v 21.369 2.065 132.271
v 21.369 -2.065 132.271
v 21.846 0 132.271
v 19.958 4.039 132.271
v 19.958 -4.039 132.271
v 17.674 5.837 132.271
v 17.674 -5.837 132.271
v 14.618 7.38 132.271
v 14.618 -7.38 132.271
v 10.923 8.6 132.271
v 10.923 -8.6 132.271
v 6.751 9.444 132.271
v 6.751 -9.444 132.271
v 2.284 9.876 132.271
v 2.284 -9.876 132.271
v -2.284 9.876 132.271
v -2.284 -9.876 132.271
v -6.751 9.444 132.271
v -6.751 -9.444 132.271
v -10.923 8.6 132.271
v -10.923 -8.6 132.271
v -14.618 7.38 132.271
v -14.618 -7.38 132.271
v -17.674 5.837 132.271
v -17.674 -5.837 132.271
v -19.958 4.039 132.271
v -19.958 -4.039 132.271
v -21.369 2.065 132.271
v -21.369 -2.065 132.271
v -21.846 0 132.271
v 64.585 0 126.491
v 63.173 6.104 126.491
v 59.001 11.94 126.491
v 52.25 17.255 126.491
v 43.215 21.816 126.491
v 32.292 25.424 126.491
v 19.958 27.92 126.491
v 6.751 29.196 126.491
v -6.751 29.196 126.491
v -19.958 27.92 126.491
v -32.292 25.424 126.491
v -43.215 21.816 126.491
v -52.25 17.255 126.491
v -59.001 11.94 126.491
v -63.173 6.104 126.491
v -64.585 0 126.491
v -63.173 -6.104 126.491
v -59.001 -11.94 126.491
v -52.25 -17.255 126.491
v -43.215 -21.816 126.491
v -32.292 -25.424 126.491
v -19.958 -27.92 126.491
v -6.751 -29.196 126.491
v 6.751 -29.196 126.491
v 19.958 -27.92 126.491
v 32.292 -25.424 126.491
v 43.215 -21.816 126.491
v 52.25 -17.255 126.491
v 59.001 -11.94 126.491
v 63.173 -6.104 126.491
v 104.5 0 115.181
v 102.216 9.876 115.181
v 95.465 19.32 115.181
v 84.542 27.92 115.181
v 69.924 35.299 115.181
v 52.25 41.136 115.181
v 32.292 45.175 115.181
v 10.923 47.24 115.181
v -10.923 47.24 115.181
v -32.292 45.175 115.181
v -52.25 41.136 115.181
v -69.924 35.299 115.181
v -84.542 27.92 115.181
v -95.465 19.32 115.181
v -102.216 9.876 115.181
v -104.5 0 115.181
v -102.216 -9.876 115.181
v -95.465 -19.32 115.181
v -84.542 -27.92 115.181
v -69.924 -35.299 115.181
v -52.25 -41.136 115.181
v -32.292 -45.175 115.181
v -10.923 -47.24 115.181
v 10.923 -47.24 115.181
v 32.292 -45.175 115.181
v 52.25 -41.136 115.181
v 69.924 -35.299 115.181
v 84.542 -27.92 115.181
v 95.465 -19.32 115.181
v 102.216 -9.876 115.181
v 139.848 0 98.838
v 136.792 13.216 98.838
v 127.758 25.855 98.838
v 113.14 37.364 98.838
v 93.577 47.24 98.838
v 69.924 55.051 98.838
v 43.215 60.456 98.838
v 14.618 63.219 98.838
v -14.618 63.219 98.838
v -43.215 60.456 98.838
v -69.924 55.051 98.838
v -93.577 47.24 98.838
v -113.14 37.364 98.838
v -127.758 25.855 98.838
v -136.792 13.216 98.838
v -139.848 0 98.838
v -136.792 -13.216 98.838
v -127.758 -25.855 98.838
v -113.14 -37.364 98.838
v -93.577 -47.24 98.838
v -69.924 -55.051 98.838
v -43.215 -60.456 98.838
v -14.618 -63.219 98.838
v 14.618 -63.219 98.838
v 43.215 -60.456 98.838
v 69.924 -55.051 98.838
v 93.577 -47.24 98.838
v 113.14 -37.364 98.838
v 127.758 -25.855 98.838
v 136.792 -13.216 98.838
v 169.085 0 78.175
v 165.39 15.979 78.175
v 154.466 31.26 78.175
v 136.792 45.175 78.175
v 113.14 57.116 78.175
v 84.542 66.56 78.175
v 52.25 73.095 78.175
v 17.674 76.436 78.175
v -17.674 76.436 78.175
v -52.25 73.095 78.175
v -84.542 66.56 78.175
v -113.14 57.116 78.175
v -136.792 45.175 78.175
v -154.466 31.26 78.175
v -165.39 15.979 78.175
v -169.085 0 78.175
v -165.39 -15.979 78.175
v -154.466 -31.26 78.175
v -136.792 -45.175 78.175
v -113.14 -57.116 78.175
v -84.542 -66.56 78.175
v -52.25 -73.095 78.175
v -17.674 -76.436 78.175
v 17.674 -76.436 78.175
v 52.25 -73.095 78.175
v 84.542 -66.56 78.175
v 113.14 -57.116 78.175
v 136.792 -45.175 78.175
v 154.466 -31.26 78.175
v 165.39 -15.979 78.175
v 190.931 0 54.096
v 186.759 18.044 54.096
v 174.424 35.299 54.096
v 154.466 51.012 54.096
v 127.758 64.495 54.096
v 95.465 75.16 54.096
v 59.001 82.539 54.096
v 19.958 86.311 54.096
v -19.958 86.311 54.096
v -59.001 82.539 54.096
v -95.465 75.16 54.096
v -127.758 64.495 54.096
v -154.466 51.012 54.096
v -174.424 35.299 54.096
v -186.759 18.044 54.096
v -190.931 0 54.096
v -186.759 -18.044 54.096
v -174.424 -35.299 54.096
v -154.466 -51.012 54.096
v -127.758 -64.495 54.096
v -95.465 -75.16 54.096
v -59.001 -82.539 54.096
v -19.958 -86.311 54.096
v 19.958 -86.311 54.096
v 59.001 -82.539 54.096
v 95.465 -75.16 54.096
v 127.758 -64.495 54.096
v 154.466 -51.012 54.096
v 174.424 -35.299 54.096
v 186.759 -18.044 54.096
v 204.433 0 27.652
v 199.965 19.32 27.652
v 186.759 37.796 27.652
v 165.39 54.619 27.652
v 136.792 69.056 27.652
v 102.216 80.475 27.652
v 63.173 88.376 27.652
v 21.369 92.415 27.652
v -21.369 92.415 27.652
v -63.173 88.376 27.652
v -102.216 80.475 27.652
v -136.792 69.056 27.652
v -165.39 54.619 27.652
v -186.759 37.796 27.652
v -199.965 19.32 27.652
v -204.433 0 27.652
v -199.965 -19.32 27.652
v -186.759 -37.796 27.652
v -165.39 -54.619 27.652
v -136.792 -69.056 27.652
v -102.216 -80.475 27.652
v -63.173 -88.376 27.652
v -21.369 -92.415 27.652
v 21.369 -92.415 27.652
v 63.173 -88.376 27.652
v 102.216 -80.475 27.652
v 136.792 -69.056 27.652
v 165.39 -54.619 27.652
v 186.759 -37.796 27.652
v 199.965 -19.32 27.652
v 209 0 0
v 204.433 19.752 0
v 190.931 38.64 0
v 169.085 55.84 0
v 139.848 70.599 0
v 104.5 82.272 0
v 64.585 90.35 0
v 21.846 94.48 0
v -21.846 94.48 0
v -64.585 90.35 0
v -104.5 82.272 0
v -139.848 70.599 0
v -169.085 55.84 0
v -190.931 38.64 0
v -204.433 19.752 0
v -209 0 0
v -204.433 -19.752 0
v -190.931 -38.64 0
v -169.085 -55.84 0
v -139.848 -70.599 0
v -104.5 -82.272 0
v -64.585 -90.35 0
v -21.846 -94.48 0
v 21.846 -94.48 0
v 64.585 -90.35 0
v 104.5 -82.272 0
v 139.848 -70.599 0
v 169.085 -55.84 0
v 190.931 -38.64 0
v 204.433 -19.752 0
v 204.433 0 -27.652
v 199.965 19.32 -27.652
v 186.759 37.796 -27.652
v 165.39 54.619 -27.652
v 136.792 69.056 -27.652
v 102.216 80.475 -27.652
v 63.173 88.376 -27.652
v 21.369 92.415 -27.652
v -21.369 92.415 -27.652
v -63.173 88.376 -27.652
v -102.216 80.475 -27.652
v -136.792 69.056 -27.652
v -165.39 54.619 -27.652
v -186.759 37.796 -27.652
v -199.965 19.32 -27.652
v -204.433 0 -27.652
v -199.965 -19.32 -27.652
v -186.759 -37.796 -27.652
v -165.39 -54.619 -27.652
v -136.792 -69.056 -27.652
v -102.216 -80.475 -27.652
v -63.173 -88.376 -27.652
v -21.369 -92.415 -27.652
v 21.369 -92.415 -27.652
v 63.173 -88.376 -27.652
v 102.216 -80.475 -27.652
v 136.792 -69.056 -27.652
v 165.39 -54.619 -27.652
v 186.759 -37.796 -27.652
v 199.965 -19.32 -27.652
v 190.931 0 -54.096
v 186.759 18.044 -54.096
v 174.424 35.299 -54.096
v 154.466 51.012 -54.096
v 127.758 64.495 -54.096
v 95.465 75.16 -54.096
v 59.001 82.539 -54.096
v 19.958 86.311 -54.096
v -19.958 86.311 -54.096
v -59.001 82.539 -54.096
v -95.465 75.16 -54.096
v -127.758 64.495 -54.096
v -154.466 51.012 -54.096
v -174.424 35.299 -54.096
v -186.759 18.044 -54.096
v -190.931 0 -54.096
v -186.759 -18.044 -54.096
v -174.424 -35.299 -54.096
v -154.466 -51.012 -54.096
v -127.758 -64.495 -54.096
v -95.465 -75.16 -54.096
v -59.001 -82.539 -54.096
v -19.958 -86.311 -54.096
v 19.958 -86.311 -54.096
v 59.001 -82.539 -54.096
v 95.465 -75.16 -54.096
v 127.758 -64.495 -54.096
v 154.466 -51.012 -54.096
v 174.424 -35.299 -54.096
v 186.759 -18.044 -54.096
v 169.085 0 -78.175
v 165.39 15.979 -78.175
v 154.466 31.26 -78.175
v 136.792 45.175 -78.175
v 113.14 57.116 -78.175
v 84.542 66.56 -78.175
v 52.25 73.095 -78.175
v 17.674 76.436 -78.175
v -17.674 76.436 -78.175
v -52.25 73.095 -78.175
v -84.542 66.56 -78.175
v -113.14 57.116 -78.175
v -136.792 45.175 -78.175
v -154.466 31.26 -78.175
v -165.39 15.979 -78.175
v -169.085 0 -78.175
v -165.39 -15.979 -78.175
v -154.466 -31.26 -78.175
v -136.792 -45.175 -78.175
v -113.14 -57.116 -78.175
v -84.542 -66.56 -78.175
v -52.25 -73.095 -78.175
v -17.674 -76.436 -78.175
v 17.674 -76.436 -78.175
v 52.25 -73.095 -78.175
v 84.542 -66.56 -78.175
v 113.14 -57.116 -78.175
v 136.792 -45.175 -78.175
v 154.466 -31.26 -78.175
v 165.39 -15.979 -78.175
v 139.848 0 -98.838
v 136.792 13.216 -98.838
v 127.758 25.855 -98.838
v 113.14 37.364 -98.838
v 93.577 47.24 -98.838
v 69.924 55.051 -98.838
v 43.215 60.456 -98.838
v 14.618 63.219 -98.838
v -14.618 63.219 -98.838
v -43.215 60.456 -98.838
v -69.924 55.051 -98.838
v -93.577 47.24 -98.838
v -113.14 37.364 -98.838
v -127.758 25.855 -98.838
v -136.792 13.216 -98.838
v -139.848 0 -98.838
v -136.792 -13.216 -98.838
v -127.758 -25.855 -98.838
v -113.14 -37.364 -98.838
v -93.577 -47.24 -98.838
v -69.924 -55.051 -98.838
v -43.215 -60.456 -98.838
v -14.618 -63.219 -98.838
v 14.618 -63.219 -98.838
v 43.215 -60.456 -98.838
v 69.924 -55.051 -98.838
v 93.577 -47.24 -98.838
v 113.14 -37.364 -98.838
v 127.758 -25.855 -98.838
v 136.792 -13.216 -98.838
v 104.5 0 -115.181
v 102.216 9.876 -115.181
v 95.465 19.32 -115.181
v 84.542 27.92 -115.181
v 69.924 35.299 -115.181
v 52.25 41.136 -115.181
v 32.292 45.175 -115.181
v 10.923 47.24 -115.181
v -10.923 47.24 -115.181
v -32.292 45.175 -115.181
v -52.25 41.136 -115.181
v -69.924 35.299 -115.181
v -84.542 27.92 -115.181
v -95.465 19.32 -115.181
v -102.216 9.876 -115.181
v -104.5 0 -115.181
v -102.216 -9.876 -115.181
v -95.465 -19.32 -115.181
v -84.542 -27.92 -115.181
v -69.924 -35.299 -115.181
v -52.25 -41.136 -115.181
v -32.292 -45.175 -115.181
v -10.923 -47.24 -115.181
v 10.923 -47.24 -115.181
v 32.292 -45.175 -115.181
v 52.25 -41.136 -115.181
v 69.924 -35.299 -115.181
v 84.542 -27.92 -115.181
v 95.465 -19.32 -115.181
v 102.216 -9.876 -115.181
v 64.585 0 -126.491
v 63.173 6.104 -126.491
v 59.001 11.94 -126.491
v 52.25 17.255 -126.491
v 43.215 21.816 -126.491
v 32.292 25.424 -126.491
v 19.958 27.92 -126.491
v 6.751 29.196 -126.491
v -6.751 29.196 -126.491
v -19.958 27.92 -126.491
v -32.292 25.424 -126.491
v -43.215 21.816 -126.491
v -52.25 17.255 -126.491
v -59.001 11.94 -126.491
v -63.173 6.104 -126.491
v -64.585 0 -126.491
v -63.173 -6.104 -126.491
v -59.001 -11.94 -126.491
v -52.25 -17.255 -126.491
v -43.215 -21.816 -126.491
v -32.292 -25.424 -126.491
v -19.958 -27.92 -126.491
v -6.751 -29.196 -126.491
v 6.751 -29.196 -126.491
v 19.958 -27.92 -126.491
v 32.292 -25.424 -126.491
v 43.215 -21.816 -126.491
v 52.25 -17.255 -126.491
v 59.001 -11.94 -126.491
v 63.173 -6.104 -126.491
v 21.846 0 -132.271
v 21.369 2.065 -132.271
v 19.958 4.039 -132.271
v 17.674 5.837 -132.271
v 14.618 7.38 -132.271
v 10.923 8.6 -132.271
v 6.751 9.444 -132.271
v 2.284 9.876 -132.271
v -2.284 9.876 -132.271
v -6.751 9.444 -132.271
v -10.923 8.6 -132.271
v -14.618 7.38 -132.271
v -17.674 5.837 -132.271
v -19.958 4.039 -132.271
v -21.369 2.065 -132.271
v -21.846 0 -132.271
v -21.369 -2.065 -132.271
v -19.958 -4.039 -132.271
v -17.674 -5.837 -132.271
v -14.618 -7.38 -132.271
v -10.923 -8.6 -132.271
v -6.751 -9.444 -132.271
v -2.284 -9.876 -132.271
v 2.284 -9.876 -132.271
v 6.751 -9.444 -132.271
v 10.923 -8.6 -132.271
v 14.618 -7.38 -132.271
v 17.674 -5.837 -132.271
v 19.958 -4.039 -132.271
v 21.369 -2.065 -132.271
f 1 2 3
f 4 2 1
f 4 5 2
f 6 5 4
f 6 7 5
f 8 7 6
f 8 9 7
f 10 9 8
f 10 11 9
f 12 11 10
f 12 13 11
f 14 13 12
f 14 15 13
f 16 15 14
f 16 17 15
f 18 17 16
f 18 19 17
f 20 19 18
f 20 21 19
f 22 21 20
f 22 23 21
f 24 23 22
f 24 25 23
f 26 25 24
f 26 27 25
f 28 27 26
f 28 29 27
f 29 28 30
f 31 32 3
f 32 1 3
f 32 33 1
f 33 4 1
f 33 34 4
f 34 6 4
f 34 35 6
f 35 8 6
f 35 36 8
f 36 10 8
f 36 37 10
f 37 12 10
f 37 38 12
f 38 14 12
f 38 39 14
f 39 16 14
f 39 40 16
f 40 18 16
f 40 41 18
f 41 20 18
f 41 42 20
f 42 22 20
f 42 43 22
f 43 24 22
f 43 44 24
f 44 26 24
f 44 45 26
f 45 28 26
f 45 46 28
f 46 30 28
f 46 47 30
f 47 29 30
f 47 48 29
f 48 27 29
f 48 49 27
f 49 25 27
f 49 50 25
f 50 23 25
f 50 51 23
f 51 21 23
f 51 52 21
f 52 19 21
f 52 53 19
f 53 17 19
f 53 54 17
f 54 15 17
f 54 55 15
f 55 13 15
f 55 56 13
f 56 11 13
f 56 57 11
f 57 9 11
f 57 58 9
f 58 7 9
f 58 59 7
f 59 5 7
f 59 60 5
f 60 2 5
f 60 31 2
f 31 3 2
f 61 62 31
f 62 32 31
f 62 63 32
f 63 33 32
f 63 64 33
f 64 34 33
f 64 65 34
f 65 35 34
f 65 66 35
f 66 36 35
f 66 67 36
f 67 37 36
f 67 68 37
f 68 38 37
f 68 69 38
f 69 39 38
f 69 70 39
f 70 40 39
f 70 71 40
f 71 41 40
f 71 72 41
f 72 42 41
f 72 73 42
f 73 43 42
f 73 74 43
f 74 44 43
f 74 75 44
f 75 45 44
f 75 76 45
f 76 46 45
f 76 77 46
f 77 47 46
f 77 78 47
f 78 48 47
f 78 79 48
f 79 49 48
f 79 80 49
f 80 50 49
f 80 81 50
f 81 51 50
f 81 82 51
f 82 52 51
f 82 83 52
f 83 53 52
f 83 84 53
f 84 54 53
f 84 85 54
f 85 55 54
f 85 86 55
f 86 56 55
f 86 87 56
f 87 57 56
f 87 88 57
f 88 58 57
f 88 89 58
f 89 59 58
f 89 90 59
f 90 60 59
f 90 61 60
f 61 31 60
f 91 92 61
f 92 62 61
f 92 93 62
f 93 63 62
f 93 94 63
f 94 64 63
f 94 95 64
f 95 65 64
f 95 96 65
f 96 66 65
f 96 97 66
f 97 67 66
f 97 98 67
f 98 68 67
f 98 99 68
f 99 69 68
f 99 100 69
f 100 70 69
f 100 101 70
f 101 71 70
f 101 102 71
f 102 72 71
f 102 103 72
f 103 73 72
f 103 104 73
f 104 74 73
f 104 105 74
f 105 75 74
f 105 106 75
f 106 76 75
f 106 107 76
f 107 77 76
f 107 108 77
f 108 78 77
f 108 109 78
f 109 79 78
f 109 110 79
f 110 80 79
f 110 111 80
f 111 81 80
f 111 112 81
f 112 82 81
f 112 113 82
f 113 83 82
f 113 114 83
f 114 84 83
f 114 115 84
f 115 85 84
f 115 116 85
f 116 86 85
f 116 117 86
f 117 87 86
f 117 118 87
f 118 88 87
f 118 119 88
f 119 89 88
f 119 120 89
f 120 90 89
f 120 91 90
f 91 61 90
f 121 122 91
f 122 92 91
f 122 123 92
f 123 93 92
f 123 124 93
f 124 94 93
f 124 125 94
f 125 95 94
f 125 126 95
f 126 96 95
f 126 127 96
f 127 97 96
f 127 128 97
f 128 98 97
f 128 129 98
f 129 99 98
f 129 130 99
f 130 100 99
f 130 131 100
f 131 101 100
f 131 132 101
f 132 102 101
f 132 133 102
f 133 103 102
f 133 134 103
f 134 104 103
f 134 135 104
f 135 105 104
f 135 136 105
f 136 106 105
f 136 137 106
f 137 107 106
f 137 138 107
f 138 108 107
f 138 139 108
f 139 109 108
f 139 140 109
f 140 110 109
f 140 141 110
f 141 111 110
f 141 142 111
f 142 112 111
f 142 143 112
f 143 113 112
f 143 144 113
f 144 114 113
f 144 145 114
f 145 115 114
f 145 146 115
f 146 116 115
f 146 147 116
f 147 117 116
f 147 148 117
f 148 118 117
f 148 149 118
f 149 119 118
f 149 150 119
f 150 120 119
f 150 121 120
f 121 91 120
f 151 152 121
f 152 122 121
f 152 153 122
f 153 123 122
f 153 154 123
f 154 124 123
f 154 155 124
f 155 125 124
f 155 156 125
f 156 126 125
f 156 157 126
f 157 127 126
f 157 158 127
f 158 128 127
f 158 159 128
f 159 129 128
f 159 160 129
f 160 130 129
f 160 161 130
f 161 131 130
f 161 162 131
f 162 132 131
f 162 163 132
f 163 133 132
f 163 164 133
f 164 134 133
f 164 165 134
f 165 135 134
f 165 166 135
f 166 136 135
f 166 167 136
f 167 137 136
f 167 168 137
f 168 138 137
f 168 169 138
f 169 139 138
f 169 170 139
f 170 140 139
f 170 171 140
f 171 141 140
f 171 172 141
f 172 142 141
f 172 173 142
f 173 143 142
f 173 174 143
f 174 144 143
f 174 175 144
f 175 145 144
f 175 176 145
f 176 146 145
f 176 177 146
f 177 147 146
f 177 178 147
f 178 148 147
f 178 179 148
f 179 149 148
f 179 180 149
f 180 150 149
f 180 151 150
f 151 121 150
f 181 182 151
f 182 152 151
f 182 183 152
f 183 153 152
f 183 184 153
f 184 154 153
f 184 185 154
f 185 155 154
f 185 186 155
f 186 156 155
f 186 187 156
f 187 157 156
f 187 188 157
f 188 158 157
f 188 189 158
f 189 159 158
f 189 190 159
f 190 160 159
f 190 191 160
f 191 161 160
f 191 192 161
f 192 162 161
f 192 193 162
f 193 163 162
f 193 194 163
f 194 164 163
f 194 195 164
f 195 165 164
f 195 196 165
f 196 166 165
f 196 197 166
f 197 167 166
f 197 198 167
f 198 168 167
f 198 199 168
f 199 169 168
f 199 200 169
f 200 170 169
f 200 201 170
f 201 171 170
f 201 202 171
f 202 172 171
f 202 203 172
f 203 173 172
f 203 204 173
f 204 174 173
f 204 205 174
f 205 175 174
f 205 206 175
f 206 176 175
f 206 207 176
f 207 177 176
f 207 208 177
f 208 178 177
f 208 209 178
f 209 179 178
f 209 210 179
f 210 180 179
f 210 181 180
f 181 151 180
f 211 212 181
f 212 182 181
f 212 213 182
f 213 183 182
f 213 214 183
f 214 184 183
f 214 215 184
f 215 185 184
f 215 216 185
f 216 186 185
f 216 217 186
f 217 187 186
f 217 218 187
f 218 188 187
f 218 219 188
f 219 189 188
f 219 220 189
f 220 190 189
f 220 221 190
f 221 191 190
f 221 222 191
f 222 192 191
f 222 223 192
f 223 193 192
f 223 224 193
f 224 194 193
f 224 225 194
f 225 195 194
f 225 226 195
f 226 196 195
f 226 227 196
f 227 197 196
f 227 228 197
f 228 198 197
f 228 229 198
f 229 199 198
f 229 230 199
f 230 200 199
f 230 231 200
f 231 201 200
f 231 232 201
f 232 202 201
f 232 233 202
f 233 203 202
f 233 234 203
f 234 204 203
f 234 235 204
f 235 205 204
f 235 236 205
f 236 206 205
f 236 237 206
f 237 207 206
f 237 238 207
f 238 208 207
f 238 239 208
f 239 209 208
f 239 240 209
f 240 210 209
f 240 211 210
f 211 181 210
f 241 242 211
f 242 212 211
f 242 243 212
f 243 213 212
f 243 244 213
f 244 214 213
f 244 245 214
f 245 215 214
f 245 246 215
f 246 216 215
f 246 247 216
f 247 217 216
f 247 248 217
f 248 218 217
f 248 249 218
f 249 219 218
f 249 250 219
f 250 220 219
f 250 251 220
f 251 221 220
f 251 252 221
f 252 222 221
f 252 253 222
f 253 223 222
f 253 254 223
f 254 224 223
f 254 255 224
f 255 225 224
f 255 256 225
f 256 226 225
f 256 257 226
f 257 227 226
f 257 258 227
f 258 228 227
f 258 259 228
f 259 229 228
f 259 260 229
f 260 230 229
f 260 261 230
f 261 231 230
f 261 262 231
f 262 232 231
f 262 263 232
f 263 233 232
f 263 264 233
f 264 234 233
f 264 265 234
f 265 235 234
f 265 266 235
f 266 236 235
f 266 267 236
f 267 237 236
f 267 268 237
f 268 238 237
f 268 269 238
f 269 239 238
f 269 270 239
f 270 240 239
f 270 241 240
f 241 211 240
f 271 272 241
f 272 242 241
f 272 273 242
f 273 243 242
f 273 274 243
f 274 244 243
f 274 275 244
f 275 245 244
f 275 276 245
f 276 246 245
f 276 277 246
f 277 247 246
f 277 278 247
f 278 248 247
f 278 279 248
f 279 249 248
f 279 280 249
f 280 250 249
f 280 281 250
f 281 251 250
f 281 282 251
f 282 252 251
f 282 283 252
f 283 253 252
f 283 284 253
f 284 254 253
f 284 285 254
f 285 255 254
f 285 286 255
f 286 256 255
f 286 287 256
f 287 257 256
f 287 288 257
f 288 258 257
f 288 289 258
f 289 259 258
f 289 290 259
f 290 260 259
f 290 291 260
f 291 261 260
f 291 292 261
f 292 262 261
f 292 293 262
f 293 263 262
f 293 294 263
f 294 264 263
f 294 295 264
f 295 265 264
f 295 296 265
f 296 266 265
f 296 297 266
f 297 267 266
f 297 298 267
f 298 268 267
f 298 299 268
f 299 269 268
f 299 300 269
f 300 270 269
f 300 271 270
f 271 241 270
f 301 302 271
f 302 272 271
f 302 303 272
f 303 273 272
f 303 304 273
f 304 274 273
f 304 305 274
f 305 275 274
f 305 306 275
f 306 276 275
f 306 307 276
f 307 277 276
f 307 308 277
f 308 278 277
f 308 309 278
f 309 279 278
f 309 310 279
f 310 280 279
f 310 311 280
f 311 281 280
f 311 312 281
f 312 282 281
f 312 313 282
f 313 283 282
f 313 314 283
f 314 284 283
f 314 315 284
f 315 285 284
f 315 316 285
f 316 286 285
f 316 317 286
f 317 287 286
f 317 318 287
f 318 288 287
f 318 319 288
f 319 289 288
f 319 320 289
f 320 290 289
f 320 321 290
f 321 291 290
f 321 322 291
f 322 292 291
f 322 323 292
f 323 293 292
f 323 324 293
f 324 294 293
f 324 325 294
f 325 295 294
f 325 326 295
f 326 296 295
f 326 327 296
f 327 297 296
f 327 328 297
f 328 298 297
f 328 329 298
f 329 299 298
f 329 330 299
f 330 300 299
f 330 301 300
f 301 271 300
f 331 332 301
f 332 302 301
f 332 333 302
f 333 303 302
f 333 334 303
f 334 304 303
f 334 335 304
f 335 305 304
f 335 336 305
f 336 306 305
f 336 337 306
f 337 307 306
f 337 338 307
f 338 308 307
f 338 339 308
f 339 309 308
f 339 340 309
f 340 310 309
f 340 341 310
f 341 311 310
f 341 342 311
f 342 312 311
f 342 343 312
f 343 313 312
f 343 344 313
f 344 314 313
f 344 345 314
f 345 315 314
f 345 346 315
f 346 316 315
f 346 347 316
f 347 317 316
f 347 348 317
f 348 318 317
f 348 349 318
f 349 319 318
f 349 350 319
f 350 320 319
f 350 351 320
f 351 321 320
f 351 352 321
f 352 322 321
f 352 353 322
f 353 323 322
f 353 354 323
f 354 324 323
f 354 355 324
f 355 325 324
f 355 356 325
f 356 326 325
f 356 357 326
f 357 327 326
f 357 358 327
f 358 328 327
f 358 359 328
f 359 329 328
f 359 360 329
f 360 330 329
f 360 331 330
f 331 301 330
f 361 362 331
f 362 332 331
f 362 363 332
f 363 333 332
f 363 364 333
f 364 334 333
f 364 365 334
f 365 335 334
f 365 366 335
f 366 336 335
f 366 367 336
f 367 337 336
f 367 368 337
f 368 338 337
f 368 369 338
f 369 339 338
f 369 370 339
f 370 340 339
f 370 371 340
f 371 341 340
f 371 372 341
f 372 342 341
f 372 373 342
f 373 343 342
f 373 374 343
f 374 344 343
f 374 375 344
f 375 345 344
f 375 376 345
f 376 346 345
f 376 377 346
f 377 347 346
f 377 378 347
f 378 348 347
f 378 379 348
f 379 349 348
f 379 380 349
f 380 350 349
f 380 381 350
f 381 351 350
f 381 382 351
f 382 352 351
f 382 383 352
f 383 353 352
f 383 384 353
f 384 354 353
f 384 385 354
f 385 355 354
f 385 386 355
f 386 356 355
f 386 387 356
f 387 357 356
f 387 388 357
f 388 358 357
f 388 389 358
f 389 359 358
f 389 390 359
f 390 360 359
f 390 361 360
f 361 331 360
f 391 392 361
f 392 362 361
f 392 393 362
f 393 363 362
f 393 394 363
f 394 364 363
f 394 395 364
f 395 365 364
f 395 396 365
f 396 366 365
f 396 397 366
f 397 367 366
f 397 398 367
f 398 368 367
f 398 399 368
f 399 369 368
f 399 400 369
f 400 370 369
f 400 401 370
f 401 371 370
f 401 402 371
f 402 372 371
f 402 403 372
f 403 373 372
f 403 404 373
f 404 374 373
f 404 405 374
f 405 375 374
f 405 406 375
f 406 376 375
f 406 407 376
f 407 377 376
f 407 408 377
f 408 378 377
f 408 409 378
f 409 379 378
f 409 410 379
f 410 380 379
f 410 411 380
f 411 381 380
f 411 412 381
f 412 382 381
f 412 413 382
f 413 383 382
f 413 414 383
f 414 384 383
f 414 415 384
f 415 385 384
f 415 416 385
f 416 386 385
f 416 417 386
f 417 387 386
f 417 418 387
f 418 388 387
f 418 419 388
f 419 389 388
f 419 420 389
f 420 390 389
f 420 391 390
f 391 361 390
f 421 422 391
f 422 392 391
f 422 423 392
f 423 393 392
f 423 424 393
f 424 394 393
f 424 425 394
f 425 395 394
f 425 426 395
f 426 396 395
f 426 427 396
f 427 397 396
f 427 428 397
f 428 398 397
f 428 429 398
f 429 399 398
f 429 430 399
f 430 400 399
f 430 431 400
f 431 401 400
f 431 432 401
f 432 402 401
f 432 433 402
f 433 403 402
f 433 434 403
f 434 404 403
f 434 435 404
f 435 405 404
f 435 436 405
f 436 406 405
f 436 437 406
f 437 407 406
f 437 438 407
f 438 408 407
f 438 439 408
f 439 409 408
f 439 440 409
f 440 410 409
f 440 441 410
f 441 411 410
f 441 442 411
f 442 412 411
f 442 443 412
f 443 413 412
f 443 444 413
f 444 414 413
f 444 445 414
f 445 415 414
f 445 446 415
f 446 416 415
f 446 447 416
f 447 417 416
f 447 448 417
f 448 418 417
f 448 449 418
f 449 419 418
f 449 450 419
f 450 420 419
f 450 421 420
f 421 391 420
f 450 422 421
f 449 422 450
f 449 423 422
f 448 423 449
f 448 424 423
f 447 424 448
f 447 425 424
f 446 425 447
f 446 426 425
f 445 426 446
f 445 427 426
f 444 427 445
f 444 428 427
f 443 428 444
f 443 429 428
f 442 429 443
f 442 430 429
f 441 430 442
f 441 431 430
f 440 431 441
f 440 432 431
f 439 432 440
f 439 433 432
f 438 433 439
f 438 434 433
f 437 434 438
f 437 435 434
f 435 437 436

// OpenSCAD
// Generated by SolidPython 1.0.1 on 2020-07-29 00:46:49


scale(v = [11, 5, 7]) {
	sphere(r = 19);
}
/***********************************************
*********      SolidPython code:      **********
************************************************
 
# import packages: SolidPython
from solid import *
from solid.utils import *
from itertools import chain, combinations, permutations


class Resize:

    def __init__(self, scad_file):
        self.scad_file = scad_file
        #self.scad_file = import_scad(scad_file)
        # cone/cylinder param:
        self.r1 = 0
        self.r2 = 0
        self.h = 0
        # rectangular prism param:
        self.w = 0
        self.l = 0
        # ellipse param:
        self.r = 0

    # import OpenScad code (file name corresponds to shape)


    # classify shape + parameters
    def assign(self, param1, param2, param3):
        if self.scad_file == 'cone.scad':
            self.r1 = param1
            self.r2 = param2
            self.h = param3
        elif self.scad_file == 'cylinder.scad':
            self.r1 = param1
            self.r2 = param2
            self.h = param3
        elif self.scad_file == 'rectangularPrism.scad':
            self.h = param1
            self.l = param2
            self.w = param3
        else:
            self.r = param1
            self.h = param2

    # resize parameters
    def iterate(self):
        x = range(3, 20, 2)
        i = 1
        if self.scad_file == 'cone.scad':
            tempList = list(permutations(x, 2))
            for temp in tempList:
                param1 = temp[0]
                param2 = temp[1]
                filepath = 'produced_scad_files/' + 'cone' + str(param1) + '_' + str(param2) + '_' + '.scad'
                scad_render_to_file(cylinder(h=param1, r1=param2, r2=0), filepath)

        elif self.scad_file == 'cylinder.scad':
            tempList = list(permutations(x, 3))
            for temp in tempList:
                param1 = temp[0]
                param2 = temp[1]
                filepath = 'produced_scad_files/' + 'cylinder' + str(param1) + '_' + str(param2) + '_' + '.scad'
                scad_render_to_file(cylinder(h=param1, r1=param2, r2=param2), filepath)

        elif self.scad_file == 'rectangularPrism.scad':
            tempList = list(permutations(x, 3))
            for temp in tempList:
                param1 = temp[0]
                param2 = temp[1]
                param3 = temp[2]
                filepath = 'produced_scad_files/' + 'rectangularPrism' + str(param1) + '_' + str(param2) + '_' + str(
                    param3) + '.scad'
                scad_render_to_file(cube(size=(param1, param2, param3)), filepath)

        elif self.scad_file == 'ellipse.scad':
            tempList = list(permutations(x, 4))
            for temp in tempList:
                param1 = temp[0]
                param2 = temp[1]
                param3 = temp[2]
                param4 = temp[3]
                filepath = 'produced_scad_files/' + 'ellipse' + str(param1) + '_' + str(param2) + '_' + str(param3) + '_' + str(param4) + '.scad'
                scad_render_to_file(scale([param1, param2, param3])(sphere(r=param4)), filepath)

    def render_to_scadfile(self):
        scad_render_to_file(scad, 'example.scad') 
 
************************************************/
